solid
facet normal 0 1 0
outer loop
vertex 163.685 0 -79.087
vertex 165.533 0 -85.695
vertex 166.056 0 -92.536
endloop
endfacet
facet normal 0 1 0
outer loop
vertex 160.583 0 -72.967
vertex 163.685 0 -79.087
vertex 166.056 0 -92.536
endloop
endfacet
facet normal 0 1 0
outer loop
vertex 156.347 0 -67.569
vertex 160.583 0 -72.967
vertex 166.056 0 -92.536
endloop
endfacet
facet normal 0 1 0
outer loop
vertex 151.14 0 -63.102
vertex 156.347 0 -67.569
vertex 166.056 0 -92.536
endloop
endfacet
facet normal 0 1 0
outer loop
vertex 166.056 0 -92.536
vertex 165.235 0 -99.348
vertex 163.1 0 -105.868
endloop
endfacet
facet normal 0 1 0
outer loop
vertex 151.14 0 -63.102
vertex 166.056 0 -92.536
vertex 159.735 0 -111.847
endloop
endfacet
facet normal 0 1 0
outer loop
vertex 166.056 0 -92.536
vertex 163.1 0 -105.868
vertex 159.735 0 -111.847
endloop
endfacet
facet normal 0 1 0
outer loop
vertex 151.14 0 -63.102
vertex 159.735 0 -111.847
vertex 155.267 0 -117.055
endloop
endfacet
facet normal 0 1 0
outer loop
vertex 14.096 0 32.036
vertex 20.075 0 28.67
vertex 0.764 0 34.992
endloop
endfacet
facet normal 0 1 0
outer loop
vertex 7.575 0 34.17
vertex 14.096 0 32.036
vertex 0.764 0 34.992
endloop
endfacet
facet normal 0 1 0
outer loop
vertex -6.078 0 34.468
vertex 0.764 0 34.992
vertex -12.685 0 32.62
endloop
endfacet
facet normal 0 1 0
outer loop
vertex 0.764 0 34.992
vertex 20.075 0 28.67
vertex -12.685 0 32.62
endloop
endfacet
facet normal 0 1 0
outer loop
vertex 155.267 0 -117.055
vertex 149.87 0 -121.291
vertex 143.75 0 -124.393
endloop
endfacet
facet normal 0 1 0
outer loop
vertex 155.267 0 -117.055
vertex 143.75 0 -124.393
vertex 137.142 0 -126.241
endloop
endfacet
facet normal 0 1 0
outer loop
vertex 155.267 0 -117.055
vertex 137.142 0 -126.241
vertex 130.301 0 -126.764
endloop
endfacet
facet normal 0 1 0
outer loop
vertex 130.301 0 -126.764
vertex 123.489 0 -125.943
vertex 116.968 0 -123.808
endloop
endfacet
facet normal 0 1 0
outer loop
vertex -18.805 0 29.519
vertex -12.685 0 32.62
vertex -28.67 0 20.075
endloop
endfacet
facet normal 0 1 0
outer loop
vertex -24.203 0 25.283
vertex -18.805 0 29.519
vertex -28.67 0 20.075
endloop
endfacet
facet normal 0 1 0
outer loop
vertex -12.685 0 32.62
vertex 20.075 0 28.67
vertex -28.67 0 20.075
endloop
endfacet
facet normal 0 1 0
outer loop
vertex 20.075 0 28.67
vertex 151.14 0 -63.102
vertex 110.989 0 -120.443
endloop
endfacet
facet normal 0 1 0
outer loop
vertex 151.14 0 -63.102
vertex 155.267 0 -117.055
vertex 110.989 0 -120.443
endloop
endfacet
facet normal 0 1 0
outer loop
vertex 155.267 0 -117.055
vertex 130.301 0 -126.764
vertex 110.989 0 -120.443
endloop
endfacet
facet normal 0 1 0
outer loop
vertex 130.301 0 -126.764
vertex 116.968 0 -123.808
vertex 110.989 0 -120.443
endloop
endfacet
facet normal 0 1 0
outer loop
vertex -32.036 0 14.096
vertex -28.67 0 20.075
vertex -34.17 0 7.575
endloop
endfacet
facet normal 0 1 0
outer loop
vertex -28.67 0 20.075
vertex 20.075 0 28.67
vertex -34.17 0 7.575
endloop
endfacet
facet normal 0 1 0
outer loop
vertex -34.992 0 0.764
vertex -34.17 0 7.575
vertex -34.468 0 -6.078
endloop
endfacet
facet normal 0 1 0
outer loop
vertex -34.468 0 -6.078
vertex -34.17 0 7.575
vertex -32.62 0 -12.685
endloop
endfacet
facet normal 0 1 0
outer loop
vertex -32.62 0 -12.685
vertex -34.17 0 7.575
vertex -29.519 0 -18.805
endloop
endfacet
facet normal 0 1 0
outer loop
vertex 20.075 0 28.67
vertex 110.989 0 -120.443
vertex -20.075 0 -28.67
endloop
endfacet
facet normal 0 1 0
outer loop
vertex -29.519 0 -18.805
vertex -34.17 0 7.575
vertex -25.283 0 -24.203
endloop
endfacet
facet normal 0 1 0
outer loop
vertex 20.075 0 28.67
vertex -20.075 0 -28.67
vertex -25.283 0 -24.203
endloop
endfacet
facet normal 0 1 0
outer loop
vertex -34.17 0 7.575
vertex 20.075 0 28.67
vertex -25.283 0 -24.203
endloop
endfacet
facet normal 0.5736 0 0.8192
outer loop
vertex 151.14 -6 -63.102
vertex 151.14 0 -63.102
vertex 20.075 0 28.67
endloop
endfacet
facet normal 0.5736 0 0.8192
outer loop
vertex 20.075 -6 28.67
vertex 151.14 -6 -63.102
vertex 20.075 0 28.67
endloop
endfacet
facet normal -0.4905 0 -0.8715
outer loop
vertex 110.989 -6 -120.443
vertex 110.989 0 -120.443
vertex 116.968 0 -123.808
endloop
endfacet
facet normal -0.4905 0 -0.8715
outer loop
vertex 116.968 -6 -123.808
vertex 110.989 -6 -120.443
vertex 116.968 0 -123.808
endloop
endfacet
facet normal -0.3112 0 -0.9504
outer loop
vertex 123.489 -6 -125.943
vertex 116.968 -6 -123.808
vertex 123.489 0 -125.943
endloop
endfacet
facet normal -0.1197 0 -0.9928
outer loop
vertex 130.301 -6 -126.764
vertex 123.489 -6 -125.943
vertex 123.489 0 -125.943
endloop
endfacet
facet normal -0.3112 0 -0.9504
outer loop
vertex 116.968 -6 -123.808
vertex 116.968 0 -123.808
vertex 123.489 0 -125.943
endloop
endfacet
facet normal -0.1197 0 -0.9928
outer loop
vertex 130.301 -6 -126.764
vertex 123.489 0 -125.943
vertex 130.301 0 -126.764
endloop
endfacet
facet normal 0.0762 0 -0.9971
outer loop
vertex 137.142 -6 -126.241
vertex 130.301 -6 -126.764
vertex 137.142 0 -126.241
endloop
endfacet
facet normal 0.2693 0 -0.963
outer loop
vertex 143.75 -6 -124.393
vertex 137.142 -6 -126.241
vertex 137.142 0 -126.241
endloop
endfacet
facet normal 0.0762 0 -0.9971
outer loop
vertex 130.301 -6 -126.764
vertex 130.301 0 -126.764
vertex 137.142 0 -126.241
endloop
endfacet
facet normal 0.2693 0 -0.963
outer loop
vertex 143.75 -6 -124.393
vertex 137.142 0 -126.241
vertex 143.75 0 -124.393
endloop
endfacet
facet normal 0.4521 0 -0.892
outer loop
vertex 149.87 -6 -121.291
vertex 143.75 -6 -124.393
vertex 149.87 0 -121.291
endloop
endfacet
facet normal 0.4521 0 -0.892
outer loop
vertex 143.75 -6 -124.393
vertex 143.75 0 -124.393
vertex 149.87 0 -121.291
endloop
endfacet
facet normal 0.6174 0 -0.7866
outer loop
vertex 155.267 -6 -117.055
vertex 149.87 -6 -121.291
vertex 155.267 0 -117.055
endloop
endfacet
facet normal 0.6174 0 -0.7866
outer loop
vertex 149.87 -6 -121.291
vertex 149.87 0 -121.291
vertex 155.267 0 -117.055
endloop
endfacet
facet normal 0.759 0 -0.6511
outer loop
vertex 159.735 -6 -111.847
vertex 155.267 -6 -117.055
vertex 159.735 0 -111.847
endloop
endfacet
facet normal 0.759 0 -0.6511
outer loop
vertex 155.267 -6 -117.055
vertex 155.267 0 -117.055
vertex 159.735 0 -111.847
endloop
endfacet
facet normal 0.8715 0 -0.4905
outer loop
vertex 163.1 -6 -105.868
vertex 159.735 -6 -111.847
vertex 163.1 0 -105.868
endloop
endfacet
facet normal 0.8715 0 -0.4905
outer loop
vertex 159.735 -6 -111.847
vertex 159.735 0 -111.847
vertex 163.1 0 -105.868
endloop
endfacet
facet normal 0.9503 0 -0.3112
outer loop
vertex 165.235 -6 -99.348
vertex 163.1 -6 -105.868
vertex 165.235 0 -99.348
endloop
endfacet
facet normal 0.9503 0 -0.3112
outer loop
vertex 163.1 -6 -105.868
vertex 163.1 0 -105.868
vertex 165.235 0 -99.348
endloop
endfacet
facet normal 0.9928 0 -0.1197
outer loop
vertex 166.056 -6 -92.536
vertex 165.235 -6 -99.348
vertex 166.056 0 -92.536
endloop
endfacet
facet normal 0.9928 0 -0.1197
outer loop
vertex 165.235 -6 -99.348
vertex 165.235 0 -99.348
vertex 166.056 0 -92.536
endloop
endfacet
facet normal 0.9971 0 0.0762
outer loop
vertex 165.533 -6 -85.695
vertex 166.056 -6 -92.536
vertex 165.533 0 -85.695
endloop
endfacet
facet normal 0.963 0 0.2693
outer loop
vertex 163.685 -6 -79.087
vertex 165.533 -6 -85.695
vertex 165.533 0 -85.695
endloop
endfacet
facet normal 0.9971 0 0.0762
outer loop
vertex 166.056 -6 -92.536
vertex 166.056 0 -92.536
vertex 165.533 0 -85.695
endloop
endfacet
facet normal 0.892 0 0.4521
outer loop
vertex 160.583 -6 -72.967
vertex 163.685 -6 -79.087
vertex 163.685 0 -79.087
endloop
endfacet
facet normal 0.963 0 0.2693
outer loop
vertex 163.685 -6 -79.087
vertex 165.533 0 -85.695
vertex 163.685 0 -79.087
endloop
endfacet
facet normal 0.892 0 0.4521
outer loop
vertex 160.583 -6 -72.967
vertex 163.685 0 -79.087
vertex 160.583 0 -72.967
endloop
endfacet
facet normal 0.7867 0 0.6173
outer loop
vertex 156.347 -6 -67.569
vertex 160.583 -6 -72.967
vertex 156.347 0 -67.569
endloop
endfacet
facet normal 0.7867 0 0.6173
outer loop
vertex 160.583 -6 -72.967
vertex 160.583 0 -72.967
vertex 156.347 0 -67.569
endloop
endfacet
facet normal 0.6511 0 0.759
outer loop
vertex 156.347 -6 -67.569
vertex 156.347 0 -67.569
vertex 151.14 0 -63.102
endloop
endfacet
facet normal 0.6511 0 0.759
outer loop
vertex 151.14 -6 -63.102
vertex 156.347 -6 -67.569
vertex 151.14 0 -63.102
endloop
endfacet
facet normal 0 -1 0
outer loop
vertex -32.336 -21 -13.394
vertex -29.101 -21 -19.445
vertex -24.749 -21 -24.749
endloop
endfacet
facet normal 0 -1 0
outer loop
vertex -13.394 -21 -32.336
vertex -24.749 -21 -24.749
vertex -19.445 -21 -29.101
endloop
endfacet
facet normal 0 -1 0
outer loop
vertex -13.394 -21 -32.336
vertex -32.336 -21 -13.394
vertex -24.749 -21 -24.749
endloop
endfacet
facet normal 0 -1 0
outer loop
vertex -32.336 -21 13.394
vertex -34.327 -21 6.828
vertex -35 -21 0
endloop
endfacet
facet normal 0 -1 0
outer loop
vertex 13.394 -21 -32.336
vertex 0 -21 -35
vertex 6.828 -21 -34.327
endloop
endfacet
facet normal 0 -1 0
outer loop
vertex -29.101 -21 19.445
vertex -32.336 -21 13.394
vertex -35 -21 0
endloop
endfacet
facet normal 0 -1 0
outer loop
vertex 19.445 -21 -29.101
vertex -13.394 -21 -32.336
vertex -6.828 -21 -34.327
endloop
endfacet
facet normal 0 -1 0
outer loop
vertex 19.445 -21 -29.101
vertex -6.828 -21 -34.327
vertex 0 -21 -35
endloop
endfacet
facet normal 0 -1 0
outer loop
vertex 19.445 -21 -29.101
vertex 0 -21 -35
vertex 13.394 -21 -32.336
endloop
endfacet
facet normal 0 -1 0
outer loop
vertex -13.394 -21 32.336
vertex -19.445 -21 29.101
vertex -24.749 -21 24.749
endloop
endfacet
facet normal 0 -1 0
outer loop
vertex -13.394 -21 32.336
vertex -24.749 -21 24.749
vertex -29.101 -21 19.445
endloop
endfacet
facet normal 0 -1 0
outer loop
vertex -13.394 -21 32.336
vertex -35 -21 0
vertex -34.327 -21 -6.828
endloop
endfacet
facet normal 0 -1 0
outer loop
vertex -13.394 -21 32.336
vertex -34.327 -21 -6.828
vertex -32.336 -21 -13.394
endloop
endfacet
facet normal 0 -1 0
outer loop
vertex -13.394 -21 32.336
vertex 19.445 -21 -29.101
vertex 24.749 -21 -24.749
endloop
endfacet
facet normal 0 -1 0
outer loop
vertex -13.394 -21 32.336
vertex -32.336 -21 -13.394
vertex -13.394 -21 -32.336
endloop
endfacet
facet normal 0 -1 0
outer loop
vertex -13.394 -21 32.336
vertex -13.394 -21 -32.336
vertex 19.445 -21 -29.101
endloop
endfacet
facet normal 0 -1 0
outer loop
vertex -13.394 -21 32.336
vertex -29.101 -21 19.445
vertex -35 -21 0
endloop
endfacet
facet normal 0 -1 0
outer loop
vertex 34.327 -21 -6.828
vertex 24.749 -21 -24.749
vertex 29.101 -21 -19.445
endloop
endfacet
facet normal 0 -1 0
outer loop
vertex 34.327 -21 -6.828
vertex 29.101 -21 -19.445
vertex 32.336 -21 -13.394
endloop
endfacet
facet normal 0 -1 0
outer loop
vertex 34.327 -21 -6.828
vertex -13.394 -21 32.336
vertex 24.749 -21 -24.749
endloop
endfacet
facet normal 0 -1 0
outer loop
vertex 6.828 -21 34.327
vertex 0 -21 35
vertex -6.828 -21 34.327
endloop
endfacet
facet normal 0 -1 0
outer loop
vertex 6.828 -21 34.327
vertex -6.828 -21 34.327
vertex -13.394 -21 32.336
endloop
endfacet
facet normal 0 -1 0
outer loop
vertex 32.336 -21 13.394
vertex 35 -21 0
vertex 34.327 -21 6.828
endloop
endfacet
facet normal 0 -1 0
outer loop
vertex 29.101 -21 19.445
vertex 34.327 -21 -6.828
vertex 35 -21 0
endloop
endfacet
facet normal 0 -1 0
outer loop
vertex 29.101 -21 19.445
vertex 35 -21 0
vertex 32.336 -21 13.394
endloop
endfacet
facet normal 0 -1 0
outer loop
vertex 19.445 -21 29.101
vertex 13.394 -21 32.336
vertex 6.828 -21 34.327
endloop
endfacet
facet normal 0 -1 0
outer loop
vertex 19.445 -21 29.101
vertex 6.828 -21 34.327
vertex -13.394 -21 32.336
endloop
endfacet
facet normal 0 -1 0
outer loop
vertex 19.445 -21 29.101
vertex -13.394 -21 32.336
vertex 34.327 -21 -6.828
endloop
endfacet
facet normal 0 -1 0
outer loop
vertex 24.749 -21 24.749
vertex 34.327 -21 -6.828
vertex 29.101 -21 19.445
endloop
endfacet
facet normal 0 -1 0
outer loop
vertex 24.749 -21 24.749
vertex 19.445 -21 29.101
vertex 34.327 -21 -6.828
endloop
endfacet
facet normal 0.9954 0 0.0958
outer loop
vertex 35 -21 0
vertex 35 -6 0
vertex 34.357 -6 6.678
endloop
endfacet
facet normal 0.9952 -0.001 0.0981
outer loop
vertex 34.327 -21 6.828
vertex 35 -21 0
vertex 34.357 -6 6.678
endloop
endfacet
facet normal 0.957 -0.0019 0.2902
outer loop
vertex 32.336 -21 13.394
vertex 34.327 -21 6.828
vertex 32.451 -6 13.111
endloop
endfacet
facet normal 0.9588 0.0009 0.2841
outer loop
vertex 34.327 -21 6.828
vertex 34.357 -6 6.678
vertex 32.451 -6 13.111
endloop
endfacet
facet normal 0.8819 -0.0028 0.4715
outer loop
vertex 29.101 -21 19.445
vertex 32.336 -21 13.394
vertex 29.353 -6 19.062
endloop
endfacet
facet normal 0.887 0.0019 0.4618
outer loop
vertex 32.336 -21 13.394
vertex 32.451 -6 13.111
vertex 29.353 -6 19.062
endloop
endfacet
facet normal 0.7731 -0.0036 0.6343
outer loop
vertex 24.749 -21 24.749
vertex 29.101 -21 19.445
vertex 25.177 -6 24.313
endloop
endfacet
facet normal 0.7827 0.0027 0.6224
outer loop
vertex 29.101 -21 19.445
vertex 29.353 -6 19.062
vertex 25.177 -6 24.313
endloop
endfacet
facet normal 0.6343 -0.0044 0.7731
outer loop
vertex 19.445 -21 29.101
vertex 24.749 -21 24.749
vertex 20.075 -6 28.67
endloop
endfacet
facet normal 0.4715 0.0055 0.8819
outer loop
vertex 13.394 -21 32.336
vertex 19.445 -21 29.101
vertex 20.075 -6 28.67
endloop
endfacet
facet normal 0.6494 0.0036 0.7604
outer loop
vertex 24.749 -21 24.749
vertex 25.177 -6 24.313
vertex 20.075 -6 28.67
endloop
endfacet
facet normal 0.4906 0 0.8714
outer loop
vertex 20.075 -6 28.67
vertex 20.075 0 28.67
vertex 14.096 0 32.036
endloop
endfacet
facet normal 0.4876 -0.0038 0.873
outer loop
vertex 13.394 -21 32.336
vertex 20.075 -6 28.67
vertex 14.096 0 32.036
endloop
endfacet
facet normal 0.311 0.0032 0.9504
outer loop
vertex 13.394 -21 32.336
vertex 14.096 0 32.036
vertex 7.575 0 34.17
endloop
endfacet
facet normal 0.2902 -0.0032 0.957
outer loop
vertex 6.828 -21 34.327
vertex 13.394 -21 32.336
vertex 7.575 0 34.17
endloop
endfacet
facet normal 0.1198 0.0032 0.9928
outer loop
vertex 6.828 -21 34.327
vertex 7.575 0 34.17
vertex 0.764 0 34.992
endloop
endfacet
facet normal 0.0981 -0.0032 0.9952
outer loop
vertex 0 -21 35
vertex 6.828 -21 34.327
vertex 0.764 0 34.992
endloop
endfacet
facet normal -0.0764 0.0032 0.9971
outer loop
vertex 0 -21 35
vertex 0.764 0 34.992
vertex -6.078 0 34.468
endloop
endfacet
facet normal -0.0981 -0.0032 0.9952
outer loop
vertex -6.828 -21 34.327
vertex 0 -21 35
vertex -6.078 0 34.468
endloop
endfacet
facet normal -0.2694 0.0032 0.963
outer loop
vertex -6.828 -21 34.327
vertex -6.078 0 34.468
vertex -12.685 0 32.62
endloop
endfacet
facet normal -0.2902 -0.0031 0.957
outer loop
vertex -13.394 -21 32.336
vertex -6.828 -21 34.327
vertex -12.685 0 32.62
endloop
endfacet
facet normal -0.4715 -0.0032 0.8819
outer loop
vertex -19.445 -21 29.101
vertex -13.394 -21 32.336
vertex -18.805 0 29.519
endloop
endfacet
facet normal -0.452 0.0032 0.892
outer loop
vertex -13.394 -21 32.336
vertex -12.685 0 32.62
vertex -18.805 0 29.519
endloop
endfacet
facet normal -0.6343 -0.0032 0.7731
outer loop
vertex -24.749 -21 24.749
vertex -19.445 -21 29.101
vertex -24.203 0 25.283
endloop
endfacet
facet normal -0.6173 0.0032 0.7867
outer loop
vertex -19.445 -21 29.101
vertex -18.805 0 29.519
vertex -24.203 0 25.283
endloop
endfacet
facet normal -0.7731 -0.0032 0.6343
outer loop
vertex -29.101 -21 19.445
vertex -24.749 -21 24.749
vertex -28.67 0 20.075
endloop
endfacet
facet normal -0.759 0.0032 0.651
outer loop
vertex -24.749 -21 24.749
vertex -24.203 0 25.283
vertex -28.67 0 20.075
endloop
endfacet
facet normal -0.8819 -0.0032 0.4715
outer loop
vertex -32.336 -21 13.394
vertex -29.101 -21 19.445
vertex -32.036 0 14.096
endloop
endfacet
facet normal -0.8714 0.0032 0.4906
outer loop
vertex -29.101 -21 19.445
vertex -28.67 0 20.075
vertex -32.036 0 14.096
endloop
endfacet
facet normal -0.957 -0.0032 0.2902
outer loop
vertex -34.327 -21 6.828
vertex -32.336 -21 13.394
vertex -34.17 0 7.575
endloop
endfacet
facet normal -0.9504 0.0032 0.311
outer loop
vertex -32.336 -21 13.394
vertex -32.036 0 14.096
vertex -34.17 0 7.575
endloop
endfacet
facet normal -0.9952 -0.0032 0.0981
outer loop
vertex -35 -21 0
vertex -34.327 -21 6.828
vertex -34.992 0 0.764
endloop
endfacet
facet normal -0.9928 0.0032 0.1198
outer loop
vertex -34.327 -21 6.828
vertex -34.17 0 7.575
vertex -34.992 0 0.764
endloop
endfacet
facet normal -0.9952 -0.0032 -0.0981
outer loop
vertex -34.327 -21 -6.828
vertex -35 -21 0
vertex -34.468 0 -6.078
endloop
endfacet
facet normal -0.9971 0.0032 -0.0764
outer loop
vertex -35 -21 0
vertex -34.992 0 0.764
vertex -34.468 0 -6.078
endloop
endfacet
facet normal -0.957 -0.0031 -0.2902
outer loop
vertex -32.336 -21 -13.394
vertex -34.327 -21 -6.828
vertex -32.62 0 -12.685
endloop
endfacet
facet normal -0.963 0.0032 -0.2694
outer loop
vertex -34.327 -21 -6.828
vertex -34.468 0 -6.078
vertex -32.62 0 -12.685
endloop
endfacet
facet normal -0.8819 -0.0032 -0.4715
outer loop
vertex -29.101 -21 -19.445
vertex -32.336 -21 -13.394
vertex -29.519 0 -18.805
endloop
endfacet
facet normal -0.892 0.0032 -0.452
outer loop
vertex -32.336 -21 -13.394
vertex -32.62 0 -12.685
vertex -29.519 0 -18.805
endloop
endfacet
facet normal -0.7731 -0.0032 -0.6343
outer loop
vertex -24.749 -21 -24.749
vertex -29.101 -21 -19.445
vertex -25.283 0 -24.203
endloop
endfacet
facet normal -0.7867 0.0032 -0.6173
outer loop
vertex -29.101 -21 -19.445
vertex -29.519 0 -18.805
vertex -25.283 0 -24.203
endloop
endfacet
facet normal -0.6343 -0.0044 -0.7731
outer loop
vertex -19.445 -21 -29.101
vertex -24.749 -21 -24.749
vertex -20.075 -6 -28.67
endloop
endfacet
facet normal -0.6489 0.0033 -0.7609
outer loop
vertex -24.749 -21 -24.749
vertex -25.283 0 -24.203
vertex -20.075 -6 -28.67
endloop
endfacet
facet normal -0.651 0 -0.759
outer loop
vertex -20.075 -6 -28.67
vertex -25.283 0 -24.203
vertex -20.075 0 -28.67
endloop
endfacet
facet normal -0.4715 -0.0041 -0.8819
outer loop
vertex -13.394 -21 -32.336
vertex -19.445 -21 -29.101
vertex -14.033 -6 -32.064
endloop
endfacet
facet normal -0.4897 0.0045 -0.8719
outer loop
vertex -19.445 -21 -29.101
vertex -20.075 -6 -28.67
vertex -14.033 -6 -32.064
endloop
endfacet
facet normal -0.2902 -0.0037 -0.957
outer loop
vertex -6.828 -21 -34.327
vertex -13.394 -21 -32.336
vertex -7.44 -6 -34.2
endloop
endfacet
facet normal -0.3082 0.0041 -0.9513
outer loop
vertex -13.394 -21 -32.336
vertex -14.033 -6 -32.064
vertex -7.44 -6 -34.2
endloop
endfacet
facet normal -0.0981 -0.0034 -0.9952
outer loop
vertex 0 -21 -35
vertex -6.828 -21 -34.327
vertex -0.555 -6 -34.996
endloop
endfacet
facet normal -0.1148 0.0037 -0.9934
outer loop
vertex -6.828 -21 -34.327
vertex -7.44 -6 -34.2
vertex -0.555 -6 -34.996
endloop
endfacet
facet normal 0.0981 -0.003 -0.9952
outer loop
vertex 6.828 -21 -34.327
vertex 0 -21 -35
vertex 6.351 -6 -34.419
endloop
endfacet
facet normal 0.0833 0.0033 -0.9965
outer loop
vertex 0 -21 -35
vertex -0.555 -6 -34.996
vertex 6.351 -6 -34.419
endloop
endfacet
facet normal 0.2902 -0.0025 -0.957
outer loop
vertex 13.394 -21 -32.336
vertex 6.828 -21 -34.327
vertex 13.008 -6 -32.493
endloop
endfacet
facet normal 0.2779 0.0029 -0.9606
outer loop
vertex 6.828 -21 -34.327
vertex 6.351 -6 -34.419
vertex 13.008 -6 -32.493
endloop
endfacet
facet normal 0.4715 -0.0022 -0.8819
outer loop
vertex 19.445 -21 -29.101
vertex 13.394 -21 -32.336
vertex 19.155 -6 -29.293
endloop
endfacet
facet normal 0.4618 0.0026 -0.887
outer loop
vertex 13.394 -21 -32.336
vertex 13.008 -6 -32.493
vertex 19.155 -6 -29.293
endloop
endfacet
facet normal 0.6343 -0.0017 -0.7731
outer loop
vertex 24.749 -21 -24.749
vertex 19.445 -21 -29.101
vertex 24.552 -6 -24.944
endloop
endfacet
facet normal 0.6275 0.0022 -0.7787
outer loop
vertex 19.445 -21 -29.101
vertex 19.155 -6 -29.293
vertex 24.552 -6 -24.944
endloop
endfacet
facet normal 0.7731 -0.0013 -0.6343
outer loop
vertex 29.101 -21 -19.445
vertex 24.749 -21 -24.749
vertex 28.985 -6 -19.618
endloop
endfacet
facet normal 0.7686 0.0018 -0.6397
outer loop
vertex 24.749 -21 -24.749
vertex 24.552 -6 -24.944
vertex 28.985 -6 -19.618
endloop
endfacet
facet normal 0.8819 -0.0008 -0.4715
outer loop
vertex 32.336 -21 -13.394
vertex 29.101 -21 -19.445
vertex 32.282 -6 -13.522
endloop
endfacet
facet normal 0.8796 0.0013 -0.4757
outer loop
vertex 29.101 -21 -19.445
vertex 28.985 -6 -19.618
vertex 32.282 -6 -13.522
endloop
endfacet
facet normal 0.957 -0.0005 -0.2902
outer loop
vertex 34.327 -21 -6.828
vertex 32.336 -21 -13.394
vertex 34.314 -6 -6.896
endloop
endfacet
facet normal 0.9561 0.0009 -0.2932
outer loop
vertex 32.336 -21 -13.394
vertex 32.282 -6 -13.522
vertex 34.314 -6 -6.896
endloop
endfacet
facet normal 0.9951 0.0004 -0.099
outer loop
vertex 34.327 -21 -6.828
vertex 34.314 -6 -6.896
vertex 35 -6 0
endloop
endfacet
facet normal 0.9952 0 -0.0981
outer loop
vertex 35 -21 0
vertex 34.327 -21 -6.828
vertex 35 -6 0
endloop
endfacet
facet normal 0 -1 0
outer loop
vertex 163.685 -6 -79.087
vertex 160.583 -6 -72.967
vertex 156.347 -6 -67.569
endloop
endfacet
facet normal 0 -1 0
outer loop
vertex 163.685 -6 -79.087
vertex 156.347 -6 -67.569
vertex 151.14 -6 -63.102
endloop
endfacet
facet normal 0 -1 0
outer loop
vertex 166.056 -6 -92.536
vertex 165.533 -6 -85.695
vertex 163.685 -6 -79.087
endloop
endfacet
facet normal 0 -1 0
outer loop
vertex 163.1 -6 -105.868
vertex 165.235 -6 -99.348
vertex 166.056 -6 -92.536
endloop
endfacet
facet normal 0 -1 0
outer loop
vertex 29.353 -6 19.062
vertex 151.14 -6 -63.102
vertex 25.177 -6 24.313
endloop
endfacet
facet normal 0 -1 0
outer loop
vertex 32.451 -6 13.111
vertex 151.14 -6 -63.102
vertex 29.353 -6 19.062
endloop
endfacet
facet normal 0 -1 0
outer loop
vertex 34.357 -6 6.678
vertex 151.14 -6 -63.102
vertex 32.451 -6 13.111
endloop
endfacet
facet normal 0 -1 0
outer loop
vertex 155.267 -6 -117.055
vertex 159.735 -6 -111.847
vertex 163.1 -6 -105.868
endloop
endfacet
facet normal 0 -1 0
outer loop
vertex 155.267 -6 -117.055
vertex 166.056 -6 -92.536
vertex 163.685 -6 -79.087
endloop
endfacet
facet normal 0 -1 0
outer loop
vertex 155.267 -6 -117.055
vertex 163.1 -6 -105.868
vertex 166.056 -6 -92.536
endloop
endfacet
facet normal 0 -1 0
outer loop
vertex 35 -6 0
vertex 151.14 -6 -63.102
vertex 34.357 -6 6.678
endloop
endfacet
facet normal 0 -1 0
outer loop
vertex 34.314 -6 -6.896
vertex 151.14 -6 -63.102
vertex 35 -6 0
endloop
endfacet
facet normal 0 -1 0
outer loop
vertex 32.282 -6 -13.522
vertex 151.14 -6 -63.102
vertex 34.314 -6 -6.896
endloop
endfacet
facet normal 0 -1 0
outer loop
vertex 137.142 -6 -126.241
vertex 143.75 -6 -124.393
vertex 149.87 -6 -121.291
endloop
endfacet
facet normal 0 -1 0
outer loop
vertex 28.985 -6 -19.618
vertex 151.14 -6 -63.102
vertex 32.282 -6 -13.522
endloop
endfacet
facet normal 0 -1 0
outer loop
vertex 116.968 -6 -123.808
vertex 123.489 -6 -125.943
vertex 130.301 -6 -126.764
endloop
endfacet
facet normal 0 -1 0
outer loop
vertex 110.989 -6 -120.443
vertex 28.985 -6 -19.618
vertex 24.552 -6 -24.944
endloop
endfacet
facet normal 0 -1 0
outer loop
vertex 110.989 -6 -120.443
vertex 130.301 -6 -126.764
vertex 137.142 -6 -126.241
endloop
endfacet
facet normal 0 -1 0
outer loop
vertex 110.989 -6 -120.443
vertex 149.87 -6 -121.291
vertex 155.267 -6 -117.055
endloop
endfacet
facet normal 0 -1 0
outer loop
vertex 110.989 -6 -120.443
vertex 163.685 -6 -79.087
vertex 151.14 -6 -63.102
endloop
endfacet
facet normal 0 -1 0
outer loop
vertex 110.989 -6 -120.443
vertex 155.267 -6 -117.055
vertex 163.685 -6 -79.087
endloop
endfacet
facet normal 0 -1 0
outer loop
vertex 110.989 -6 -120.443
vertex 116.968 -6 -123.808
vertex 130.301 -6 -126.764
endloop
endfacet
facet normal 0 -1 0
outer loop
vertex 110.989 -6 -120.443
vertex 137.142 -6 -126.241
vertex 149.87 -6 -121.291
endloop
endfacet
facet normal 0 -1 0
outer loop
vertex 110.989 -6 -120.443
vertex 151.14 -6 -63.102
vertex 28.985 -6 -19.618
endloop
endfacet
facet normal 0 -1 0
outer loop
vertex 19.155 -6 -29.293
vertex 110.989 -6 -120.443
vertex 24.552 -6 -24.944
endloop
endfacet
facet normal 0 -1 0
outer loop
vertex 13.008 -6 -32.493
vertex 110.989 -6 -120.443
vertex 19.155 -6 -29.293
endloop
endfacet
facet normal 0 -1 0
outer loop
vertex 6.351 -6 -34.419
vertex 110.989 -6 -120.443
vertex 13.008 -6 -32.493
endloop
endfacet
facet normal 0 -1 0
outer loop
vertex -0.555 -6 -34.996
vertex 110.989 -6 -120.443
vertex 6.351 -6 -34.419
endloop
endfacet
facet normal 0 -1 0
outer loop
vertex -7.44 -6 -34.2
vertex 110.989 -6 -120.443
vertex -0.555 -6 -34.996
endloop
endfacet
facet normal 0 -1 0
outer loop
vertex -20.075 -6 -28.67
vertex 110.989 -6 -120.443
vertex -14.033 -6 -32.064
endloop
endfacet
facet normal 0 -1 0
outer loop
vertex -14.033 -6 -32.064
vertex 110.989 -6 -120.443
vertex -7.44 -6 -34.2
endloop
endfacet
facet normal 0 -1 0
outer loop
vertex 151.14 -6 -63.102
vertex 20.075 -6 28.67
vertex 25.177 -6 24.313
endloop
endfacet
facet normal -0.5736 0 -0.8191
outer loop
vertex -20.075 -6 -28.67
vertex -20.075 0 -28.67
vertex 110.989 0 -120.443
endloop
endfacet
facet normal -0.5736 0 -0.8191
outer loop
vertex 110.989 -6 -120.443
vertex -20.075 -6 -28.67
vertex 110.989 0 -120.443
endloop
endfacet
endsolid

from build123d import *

# Parameters (mm, degrees)
BOSS_EXTRUDE1_DEPTH = 6
SKETCH2_R           = 35
BOSS_EXTRUDE2_DEPTH = 15


with BuildPart() as part:
    # Sketch1 → Boss-Extrude1 (new body)
    with BuildSketch(Plane(origin=(0, 0, 0), x_dir=(1, 0, 0), z_dir=(0, 1, 0))):
        with BuildLine():
            Line((-20.075175272, 28.67032155), (110.989151814, 120.442551366))
            ThreePointArc((110.989151814, 120.442551366), (159.734648636, 111.847405088), (151.139502359, 63.101908266))
            Line((151.139502359, 63.101908266), (20.075175272, -28.67032155))
            ThreePointArc((20.075175272, -28.67032155), (-28.67032155, -20.075175272), (-20.075175272, 28.67032155))
        make_face()
    extrude(amount=-BOSS_EXTRUDE1_DEPTH)

    # Sketch2 → Boss-Extrude2 (add)
    with BuildSketch(Plane.XZ.offset(6)):
        Circle(SKETCH2_R)
    extrude(amount=BOSS_EXTRUDE2_DEPTH)


solid = part.part
